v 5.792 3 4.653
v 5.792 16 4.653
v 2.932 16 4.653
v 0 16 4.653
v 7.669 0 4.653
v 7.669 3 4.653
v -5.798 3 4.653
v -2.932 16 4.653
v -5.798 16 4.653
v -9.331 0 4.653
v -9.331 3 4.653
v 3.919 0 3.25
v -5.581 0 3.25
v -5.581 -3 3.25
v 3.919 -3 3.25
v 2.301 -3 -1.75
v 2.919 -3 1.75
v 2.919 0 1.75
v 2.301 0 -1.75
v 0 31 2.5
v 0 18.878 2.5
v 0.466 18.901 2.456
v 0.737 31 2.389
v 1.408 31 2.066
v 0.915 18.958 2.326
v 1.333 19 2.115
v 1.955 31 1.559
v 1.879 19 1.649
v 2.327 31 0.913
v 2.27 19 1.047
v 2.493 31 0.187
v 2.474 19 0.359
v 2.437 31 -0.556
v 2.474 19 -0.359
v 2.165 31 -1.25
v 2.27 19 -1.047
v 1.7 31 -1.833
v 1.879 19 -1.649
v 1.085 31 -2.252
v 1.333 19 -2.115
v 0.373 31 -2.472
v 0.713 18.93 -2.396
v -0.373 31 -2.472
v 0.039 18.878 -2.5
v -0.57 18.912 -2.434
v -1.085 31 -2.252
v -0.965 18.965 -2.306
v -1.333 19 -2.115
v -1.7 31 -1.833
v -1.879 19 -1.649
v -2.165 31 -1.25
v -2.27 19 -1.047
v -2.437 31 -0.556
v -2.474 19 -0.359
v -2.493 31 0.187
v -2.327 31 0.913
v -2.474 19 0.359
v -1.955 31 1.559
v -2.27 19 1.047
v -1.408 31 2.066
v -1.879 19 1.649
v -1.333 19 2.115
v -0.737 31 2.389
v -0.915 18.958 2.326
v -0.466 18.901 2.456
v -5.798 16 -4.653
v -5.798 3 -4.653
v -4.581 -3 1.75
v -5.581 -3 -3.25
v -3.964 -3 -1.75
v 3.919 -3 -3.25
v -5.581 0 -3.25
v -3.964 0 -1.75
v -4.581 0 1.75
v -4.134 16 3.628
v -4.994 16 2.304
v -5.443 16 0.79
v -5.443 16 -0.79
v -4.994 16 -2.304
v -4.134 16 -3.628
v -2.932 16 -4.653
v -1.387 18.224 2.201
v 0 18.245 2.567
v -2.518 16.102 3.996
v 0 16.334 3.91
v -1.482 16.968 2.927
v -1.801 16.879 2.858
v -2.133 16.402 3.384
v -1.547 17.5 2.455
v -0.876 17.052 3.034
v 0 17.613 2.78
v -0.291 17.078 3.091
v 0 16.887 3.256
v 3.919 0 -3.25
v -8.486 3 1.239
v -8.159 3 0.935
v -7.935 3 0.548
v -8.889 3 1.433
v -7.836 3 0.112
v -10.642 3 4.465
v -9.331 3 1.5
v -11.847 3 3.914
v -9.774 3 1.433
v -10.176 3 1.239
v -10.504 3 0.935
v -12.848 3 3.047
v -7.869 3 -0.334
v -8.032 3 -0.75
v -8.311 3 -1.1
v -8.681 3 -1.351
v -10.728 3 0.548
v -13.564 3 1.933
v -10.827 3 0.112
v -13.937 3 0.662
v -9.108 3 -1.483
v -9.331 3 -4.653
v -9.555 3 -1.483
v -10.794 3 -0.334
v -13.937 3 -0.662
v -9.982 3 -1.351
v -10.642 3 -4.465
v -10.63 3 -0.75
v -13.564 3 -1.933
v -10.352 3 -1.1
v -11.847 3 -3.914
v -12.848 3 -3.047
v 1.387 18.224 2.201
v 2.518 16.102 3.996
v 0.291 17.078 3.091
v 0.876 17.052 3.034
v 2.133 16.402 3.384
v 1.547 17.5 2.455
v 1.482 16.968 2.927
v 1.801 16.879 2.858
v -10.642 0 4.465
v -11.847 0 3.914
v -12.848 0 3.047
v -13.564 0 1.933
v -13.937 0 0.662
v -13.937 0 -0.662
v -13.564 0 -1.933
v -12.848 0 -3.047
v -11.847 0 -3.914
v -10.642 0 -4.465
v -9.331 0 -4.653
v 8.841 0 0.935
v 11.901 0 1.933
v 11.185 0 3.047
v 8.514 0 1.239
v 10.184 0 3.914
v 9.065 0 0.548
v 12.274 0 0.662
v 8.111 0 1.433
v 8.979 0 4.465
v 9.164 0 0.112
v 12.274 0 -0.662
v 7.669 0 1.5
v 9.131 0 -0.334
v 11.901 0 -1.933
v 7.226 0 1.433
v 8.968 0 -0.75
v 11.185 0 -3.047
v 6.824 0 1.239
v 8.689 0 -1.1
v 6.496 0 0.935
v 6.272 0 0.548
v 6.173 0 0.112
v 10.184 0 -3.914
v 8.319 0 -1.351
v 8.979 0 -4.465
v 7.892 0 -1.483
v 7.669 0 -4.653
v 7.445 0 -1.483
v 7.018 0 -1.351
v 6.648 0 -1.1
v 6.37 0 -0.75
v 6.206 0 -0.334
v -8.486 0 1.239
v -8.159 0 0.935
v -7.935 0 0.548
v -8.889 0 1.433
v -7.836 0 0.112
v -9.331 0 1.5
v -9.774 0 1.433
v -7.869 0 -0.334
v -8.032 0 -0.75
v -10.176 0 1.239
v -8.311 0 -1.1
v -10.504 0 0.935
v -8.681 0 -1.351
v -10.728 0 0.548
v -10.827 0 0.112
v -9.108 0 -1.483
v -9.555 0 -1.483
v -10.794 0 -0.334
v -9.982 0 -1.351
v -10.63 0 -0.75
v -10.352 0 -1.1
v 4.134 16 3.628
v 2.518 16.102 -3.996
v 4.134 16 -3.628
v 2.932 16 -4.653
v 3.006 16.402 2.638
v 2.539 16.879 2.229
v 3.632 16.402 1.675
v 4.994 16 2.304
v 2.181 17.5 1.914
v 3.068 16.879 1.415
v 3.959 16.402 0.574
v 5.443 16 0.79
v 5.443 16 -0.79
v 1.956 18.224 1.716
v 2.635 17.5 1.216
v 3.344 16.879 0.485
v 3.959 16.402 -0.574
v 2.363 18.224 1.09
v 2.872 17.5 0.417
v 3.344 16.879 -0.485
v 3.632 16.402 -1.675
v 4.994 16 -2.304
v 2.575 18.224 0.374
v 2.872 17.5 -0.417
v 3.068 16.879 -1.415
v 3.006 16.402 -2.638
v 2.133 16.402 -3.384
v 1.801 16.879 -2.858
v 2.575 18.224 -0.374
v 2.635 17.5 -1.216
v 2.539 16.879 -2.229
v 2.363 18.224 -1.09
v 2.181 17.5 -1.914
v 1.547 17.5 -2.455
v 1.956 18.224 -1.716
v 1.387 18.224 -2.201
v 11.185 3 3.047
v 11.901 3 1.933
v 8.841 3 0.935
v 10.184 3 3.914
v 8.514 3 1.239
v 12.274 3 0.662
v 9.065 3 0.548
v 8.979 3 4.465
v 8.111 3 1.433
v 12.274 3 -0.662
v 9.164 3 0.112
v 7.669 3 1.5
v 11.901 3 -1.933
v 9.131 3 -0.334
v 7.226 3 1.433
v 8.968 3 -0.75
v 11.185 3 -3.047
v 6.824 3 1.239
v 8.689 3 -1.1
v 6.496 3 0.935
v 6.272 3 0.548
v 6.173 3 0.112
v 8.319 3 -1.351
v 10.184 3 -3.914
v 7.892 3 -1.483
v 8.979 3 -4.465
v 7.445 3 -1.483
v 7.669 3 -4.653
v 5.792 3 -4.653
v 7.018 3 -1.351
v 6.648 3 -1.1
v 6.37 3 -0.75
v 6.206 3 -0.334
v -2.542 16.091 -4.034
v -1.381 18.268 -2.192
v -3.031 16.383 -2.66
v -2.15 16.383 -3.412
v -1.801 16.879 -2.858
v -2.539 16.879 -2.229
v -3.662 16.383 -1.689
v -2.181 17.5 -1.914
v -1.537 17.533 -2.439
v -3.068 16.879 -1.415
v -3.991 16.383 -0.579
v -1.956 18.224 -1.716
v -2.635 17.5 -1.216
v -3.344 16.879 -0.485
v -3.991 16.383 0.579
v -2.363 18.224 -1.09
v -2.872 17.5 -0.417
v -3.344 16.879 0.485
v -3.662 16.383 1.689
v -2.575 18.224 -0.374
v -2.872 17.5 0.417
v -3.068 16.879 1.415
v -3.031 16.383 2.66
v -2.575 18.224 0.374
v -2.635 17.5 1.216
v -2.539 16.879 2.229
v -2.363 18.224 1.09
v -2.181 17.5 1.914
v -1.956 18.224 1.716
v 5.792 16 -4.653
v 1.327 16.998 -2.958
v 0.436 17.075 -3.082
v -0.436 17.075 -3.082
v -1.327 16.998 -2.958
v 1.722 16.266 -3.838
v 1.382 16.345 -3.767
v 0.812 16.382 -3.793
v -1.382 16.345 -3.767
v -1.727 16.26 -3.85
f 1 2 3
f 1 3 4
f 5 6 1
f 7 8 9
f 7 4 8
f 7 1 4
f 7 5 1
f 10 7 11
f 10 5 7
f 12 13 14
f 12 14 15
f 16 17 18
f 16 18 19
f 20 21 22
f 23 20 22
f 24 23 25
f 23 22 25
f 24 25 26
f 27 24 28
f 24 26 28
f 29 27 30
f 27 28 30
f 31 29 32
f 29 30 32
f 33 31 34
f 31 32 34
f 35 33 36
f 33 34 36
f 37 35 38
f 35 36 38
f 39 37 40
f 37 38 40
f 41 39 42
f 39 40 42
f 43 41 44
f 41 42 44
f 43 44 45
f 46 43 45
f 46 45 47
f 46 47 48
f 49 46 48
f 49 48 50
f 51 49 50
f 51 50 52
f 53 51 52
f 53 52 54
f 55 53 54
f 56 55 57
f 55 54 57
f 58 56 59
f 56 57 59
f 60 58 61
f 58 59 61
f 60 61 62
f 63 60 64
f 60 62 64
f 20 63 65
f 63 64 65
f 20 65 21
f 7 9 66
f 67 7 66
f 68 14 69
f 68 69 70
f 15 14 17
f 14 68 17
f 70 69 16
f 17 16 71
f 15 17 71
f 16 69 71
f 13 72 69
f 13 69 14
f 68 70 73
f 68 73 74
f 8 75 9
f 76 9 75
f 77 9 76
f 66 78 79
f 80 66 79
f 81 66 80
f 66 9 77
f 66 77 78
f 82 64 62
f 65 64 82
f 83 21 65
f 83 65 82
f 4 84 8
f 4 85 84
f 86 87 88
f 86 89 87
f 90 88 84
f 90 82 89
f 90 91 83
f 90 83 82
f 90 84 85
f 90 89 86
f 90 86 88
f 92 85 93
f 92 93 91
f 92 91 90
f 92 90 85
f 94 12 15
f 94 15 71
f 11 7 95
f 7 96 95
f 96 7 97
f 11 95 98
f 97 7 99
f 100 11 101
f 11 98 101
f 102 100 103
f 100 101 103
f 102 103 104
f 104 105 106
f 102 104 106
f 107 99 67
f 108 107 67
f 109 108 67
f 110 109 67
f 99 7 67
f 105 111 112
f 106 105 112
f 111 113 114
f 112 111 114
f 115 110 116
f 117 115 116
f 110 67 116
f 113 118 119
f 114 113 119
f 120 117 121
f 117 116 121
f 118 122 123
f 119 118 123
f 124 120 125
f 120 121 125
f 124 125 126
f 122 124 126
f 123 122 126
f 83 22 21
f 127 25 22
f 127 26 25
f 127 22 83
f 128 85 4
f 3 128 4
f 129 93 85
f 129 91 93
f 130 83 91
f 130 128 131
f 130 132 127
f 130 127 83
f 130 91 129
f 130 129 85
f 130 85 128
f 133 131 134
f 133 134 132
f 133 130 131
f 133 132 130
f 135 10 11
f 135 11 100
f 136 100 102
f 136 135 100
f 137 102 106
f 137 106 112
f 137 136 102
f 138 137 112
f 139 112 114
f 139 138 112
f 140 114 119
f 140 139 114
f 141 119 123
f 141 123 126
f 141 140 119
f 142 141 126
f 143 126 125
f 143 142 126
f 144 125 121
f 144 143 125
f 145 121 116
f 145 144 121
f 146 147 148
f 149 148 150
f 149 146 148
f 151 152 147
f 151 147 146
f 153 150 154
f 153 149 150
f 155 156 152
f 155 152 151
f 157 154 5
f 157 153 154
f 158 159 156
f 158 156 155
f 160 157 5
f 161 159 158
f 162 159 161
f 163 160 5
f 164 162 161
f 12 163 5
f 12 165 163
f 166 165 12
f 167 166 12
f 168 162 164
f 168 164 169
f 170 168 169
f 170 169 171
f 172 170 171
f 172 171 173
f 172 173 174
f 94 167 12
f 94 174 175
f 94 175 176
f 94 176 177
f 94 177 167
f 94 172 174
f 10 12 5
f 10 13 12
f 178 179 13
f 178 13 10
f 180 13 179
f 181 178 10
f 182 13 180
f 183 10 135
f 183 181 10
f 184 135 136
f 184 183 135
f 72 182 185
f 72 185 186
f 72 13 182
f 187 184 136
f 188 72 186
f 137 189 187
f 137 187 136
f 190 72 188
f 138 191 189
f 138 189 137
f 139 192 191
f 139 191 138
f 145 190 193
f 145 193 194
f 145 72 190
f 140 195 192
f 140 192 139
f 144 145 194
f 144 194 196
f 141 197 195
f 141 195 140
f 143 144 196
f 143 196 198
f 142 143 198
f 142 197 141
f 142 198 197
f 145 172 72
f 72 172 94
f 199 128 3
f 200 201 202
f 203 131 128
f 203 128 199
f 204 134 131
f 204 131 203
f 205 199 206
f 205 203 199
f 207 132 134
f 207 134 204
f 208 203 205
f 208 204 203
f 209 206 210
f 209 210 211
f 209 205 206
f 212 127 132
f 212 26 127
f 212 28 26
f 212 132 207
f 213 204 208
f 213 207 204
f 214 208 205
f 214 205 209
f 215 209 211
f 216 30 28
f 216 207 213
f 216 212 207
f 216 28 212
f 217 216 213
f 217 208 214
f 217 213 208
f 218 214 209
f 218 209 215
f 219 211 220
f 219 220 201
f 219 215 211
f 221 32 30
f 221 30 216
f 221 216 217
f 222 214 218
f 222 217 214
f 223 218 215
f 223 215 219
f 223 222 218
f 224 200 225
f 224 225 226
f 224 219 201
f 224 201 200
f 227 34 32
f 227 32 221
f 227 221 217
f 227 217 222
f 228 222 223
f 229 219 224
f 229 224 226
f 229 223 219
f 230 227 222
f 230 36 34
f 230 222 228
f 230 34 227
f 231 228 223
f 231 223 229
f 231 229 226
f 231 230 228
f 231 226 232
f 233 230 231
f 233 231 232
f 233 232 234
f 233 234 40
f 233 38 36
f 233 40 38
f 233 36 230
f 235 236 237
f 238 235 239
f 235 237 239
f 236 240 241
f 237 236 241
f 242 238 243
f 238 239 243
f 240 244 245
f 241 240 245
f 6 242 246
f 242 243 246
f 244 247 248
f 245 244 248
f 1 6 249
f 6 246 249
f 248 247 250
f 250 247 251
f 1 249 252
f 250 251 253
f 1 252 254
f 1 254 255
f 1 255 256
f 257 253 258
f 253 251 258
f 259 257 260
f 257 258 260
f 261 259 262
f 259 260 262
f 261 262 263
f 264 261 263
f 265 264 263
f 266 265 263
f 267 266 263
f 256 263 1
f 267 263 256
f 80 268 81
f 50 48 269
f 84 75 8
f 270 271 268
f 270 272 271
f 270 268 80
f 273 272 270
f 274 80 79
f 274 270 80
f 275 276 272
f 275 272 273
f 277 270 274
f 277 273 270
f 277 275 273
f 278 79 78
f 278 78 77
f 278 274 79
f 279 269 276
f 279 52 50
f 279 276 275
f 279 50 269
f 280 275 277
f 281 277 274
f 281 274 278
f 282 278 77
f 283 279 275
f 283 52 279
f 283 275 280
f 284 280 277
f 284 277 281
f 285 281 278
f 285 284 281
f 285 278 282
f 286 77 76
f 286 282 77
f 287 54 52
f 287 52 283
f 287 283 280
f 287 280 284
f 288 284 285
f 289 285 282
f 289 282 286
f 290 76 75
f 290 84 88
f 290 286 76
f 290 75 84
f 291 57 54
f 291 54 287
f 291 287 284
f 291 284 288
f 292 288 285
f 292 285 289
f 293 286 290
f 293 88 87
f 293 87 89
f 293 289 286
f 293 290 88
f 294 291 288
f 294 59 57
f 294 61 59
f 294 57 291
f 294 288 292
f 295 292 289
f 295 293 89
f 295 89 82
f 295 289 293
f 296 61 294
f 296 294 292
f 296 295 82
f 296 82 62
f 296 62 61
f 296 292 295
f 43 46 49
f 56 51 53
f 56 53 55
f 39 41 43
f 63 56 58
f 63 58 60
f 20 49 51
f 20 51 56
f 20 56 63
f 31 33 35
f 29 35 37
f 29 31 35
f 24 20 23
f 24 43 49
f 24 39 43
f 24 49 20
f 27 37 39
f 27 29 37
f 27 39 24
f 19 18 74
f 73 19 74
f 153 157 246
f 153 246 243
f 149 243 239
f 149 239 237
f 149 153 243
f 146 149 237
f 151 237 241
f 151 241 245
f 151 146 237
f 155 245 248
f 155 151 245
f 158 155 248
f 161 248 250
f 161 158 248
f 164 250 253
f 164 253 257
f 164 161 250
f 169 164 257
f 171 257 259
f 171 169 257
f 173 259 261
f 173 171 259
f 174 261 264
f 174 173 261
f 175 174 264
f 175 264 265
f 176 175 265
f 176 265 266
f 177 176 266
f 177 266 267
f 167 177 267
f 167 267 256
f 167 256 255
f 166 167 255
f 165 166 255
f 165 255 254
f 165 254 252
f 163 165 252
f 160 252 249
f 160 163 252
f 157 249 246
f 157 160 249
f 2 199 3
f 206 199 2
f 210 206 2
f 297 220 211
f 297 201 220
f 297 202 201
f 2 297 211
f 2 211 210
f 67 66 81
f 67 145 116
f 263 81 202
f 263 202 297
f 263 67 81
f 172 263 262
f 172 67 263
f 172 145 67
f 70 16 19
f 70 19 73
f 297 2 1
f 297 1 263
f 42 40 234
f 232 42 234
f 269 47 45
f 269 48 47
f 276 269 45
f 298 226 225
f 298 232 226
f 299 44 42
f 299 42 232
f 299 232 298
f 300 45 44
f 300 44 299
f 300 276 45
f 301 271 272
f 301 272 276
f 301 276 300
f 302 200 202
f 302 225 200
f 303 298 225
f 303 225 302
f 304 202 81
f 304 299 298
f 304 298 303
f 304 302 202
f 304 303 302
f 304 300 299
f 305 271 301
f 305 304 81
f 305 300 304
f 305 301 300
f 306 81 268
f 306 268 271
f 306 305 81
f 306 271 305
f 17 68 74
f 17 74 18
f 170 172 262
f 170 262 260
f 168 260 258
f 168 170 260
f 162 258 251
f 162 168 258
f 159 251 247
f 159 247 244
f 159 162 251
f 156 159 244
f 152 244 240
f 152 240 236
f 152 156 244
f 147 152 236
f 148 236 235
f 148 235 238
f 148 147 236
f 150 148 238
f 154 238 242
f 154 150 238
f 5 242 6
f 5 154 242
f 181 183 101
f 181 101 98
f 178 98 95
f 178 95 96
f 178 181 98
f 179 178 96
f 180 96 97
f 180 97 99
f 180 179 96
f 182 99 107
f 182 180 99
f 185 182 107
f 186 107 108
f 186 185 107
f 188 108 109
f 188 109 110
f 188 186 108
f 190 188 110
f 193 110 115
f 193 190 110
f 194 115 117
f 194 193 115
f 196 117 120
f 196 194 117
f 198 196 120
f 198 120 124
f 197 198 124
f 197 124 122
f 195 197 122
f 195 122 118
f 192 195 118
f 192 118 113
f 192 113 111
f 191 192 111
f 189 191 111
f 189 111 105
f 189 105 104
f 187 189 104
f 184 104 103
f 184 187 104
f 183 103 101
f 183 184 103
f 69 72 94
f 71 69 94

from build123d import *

# Parameters (mm, degrees)
EXTRUDE_1_DEPTH     = 3
SKETCH_1_3_W        = 9.5
SKETCH_1_3_H        = 6.5
EXTRUDE_2_DEPTH     = 3
SKETCH_1_4_R        = 1.5
CUT_EXTRUDE_1_DEPTH = 3
CUT_EXTRUDE_2_DEPTH = 3
SKETCH_3_W          = 11.590372196
SKETCH_3_H          = 9.306034482
EXTRUDE_3_DEPTH     = 13
SKETCH_4_R          = 2.5
EXTRUDE_4_DEPTH     = 15
FILLET_1_R          = 3


with BuildPart() as part:
    # 草图1 → 凸台-拉伸1 (new body)
    with BuildSketch(Plane(origin=(0, 0, 0), x_dir=(1, 0, 0), z_dir=(0, 1, 0))):
        with BuildLine():
            Line((-9.33144513, 4.653017241), (7.66855487, 4.653017241))
            ThreePointArc((7.66855487, 4.653017241), (12.321572111, 0), (7.66855487, -4.653017241))
            Line((7.66855487, -4.653017241), (-9.33144513, -4.653017241))
            ThreePointArc((-9.33144513, -4.653017241), (-13.984462372, 0), (-9.33144513, 4.653017241))
        make_face()
    extrude(amount=EXTRUDE_1_DEPTH)

    # 草图1<3> → 凸台-拉伸2 (add)
    with BuildSketch(Plane(origin=(0, 0, 0), x_dir=(1, 0, 0), z_dir=(0, 1, 0))):
        with Locations((-0.83144513, 0)):
            Rectangle(SKETCH_1_3_W, SKETCH_1_3_H)
    extrude(amount=-EXTRUDE_2_DEPTH)

    # 草图1<4> → 切除-拉伸1 (cut)
    with BuildSketch(Plane(origin=(0, 0, 0), x_dir=(1, 0, 0), z_dir=(0, 1, 0))):
        with Locations((-9.33144513, 0)):
            Circle(SKETCH_1_4_R)
        with Locations((7.66855487, 0)):
            Circle(SKETCH_1_4_R)
    extrude(amount=CUT_EXTRUDE_1_DEPTH, mode=Mode.SUBTRACT)

    # 草图2 → 切除-拉伸2 (cut)
    with BuildSketch(Plane.XZ.offset(3)):
        Polygon((-4.58144513, 1.75), (2.91855487, 1.75), (2.301410437, -1.75), (-3.964300698, -1.75), align=None)
    extrude(amount=-CUT_EXTRUDE_2_DEPTH, mode=Mode.SUBTRACT)

    # 草图3 → 凸台-拉伸3 (add)
    with BuildSketch(Plane(origin=(0, 3, 0), x_dir=(1, 0, 0), z_dir=(0, 1, 0))):
        with Locations((-0.00308465, 0)):
            Rectangle(SKETCH_3_W, SKETCH_3_H)
    extrude(amount=EXTRUDE_3_DEPTH)

    # 草图4 → 凸台-拉伸4 (add)
    with BuildSketch(Plane(origin=(0, 16, 0), x_dir=(1, 0, 0), z_dir=(0, 1, 0))):
        Circle(SKETCH_4_R)
    extrude(amount=EXTRUDE_4_DEPTH)

    # 圆角1
    fillet_1_edges = [part.edges().sort_by_distance(p)[0] for p in [
        (-2.5, 16, 0),
    ]]
    fillet(fillet_1_edges, radius=FILLET_1_R)


solid = part.part
